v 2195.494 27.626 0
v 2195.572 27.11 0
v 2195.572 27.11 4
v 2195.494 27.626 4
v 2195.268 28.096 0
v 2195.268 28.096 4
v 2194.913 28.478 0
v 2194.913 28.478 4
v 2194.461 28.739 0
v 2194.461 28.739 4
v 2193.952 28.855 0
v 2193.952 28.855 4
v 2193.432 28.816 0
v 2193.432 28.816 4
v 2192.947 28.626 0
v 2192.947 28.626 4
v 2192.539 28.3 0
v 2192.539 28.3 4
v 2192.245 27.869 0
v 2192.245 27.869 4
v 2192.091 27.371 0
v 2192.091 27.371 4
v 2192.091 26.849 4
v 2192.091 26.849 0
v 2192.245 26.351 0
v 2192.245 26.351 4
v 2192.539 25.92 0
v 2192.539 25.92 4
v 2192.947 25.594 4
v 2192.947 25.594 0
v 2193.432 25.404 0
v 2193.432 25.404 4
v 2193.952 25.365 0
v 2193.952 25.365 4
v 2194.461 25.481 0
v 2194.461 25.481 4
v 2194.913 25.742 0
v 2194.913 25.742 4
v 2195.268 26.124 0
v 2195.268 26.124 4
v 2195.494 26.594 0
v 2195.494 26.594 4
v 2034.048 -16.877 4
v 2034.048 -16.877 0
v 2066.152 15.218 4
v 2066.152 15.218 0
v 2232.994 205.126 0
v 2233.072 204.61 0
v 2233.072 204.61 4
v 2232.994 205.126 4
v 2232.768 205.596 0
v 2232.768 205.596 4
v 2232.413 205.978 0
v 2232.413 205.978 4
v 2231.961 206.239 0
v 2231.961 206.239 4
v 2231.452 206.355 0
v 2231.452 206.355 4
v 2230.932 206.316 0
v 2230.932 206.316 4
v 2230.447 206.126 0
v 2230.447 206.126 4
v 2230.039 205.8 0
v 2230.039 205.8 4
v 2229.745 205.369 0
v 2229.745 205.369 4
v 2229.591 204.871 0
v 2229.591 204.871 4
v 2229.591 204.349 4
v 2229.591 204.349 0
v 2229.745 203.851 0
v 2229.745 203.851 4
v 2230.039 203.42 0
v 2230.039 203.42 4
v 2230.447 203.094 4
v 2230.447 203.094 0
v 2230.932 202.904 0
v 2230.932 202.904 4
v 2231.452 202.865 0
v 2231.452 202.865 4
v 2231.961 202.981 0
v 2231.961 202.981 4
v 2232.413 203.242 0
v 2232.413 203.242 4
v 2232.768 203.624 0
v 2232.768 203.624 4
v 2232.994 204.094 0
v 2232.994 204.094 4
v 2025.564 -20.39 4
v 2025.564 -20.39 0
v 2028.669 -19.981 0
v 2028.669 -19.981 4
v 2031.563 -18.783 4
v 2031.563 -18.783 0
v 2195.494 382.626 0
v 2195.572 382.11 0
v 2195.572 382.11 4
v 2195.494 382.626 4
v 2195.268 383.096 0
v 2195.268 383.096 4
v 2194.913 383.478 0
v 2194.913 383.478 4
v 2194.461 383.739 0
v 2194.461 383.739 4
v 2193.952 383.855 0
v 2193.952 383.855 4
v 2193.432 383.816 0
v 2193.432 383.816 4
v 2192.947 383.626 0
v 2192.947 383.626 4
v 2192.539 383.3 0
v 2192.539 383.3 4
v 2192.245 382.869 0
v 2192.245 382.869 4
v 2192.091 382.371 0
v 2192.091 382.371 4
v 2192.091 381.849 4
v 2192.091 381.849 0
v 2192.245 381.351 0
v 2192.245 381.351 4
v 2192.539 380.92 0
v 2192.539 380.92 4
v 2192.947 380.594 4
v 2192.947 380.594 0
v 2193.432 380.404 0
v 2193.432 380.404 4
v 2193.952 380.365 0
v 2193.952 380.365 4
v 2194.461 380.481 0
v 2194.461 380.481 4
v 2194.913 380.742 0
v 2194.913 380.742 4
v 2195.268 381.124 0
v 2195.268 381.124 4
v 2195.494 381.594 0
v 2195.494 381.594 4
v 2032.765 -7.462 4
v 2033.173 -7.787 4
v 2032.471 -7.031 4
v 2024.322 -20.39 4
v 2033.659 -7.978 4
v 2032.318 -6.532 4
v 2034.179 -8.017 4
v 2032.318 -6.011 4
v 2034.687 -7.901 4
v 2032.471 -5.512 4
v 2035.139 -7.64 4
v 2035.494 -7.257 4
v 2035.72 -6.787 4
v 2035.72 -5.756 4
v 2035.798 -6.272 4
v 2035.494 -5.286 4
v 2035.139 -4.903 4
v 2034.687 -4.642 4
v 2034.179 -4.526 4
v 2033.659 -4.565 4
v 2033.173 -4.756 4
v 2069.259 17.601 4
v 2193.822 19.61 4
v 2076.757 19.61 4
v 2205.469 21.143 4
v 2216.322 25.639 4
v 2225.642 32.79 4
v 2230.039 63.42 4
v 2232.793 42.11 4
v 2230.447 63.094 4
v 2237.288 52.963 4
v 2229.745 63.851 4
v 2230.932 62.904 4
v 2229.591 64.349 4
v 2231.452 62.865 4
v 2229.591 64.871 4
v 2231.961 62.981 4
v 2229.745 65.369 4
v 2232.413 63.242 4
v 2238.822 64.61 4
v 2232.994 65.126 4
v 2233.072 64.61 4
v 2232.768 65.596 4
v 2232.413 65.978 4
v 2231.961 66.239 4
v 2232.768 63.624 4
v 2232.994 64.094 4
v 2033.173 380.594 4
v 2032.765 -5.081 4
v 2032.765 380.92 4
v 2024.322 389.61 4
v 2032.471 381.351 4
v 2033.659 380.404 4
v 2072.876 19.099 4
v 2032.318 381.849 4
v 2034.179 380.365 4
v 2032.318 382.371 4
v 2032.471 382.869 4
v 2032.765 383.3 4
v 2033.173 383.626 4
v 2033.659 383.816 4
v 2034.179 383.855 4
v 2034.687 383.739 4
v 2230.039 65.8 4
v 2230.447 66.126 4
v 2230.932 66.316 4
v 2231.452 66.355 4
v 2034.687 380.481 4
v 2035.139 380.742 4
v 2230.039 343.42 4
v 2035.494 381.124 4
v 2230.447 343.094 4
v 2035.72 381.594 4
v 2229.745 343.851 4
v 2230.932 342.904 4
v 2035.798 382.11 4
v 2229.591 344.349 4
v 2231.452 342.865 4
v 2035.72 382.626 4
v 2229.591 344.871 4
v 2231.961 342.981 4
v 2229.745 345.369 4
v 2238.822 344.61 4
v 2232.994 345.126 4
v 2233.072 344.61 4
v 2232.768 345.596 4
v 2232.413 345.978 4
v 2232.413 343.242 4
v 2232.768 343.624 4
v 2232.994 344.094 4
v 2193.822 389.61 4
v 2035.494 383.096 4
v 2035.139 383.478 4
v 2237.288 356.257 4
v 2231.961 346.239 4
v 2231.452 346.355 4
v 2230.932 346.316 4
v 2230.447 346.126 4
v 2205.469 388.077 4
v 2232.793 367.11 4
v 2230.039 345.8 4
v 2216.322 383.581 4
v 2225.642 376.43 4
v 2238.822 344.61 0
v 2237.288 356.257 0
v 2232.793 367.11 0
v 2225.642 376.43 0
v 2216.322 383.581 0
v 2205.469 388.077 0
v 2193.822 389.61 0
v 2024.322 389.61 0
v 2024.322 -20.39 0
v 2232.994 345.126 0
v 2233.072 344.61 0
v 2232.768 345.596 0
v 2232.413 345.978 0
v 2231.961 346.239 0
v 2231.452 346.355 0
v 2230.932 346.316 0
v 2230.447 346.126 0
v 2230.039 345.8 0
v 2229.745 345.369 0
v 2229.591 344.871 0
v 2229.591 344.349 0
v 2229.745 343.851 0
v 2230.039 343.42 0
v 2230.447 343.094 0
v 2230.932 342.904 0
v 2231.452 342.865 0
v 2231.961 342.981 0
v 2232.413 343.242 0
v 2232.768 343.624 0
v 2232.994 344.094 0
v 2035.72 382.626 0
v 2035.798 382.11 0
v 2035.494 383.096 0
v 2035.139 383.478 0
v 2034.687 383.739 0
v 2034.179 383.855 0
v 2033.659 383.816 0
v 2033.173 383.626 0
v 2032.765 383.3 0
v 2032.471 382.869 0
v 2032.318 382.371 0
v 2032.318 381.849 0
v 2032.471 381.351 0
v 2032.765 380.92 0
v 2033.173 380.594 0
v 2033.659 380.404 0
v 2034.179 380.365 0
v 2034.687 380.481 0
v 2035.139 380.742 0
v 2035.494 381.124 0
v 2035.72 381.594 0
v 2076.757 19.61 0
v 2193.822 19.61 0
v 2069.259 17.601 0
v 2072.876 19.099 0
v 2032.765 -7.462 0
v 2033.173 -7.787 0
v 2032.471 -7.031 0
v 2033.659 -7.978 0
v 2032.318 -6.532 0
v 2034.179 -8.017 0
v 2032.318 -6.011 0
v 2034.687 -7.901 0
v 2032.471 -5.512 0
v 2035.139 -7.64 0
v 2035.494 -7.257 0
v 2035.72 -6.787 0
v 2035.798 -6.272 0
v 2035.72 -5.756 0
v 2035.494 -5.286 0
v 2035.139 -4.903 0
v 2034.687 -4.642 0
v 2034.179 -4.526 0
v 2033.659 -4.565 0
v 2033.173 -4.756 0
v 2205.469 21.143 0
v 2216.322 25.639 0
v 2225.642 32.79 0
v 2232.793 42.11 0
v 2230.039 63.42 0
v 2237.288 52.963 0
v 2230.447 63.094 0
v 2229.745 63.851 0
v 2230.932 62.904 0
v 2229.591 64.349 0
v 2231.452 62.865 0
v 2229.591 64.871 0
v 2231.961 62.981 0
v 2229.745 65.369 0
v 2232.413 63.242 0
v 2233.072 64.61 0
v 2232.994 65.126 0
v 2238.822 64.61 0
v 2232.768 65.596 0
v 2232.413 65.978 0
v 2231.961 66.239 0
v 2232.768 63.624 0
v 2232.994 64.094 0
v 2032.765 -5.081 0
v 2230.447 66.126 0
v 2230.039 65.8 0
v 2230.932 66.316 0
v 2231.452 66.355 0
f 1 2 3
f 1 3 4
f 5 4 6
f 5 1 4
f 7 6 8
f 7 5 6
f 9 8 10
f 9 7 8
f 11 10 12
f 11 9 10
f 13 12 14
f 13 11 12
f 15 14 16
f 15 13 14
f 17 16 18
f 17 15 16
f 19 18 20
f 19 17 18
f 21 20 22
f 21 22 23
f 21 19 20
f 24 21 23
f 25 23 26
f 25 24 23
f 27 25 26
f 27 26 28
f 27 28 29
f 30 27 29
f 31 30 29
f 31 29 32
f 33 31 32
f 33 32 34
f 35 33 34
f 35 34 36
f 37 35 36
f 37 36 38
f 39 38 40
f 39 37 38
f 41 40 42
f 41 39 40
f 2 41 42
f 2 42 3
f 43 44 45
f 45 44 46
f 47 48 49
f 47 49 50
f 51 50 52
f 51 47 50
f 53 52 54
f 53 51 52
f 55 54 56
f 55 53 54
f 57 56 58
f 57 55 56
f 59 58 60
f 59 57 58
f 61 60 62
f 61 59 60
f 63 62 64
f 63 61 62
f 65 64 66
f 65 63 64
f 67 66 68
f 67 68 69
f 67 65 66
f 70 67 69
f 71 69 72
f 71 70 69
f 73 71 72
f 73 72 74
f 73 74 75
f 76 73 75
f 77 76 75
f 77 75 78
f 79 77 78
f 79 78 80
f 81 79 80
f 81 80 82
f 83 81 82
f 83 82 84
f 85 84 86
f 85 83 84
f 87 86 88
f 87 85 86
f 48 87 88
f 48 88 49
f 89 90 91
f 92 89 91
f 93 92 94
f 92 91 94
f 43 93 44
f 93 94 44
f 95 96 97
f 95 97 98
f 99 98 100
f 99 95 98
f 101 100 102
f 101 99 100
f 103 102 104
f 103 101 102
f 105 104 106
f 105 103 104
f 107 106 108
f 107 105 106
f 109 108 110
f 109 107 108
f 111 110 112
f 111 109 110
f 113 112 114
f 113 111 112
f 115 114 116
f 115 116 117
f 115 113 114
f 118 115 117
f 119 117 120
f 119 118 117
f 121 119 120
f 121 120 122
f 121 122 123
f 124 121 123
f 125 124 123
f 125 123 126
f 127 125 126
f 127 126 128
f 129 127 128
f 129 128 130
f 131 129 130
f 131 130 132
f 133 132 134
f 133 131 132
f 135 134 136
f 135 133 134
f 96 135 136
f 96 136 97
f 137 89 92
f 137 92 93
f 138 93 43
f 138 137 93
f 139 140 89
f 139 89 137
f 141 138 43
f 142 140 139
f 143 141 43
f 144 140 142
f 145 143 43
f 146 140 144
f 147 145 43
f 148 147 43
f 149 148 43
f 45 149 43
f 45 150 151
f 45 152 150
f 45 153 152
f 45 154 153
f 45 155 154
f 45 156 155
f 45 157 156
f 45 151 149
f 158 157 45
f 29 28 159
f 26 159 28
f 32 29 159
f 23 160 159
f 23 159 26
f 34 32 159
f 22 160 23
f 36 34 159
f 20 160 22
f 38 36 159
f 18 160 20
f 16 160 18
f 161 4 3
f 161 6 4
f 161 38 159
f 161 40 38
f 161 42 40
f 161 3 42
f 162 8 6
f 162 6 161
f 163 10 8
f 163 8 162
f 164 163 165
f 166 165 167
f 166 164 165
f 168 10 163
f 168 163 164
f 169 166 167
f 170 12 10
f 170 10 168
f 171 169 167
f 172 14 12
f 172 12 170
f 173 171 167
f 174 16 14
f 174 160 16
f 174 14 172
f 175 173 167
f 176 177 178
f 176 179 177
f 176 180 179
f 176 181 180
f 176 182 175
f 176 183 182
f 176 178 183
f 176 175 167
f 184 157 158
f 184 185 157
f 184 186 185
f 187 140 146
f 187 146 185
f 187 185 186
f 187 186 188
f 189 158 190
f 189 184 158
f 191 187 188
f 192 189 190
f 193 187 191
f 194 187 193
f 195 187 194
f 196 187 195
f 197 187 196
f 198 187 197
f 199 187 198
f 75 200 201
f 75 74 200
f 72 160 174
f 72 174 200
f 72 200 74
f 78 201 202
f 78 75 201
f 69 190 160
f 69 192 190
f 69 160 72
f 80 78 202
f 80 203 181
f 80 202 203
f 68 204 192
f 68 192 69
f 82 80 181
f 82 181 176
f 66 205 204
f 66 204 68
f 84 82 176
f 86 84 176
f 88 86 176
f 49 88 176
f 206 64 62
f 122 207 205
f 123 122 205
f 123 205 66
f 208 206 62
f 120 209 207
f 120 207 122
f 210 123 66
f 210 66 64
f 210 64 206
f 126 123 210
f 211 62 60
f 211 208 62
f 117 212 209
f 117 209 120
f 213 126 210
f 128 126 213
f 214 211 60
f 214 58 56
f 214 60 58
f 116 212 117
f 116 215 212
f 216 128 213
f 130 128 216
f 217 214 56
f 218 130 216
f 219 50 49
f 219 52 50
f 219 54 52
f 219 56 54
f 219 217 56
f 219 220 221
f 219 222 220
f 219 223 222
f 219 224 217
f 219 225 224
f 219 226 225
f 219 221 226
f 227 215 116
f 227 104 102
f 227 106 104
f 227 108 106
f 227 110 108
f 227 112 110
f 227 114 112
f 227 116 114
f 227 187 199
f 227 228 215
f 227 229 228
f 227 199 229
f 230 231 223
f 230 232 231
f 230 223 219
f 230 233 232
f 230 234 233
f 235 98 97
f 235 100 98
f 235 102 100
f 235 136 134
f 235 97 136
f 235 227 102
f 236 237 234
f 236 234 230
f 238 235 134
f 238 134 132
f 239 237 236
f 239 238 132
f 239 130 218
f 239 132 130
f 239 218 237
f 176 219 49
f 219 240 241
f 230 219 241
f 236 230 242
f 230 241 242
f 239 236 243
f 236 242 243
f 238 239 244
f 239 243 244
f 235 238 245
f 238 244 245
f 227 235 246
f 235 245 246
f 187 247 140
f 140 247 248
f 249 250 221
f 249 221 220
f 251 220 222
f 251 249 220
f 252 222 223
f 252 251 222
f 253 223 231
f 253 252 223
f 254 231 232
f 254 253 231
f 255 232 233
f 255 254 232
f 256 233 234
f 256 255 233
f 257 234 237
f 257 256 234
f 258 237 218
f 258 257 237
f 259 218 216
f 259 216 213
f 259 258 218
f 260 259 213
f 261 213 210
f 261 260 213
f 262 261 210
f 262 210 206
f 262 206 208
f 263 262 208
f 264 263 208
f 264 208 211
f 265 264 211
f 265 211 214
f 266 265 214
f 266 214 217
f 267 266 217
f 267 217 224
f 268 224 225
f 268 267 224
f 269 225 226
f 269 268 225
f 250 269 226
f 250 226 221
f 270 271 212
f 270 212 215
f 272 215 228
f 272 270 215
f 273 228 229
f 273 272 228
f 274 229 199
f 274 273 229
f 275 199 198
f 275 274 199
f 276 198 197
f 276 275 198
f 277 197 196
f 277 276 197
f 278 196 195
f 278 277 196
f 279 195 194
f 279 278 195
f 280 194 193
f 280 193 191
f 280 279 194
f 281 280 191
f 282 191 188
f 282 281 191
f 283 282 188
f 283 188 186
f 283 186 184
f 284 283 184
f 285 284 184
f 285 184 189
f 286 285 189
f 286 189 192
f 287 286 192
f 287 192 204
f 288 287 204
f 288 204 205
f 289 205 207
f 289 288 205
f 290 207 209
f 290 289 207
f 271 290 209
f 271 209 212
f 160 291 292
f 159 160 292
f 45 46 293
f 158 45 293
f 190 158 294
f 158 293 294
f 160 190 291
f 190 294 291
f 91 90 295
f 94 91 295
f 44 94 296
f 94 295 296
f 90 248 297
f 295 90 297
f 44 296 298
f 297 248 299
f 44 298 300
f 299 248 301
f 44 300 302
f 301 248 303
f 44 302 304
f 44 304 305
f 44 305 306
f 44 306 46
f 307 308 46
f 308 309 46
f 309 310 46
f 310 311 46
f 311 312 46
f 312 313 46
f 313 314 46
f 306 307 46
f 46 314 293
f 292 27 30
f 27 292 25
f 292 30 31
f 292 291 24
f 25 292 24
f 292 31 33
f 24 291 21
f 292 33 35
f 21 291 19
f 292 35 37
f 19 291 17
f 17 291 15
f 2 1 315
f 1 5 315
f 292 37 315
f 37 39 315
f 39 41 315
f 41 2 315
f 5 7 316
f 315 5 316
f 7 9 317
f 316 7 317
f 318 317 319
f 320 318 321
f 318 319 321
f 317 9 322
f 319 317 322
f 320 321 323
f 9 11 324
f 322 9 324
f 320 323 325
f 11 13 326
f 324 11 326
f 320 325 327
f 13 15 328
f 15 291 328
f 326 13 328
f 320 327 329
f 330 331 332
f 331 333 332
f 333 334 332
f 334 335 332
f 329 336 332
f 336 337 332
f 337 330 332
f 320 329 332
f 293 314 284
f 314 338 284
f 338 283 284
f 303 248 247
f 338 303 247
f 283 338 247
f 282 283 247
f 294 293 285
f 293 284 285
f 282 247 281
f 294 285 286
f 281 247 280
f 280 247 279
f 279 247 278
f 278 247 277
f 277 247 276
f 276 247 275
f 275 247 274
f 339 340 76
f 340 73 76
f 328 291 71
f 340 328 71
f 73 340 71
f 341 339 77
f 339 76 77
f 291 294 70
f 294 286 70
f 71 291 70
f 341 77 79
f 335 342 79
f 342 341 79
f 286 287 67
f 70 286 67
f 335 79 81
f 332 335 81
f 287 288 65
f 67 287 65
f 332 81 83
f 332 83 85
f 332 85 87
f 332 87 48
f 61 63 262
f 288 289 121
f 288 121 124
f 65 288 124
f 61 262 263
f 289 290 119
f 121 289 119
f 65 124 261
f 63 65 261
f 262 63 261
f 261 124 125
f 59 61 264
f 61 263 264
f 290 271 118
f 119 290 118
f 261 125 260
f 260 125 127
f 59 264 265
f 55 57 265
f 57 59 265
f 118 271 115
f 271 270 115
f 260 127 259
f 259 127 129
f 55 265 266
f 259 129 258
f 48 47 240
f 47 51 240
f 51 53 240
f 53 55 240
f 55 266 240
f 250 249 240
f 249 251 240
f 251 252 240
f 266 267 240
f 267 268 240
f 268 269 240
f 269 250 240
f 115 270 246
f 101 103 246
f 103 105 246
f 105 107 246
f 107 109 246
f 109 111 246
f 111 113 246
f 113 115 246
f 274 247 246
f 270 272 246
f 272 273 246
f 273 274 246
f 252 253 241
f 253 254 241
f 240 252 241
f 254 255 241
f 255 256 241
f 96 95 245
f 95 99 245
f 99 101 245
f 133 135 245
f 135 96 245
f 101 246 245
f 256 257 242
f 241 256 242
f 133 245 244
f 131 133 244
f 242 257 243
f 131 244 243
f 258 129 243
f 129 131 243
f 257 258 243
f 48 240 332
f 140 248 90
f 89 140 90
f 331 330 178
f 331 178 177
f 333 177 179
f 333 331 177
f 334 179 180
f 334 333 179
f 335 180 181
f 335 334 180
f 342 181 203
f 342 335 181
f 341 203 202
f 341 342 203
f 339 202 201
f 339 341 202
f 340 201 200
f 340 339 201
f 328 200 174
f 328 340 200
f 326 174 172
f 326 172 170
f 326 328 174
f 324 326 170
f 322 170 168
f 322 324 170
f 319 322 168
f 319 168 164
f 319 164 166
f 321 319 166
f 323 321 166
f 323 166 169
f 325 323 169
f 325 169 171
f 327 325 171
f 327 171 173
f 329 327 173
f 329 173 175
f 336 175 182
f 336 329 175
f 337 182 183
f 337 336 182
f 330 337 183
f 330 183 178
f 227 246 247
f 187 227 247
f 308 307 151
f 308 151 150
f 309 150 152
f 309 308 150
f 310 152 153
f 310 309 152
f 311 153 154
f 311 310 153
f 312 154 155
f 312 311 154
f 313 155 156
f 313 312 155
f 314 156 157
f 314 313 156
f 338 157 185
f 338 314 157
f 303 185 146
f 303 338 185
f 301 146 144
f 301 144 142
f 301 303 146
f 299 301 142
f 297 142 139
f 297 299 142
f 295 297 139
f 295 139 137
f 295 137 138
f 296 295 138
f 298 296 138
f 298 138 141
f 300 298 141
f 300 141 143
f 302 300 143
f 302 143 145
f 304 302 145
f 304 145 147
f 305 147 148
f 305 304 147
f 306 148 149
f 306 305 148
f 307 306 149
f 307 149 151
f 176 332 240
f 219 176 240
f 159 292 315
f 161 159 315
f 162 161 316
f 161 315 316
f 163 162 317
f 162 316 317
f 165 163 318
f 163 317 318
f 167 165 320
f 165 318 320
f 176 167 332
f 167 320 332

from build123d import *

# Parameters (mm, degrees)
SKETCH1_R           = 1.75
BOSS_EXTRUDE1_DEPTH = 4


with BuildPart() as part:
    # Sketch1 → Boss-Extrude1 (new body)
    with BuildSketch(Plane.XY):
        with BuildLine():
            Line((2024.321699886, -20.389970185), (2025.564078039, -20.389970185))
            ThreePointArc((2025.564078039, -20.389970185), (2030.155451072, -19.476867572), (2034.048091653, -16.876519131))
            Line((2034.048091653, -16.876519131), (2066.152417854, 15.218215997))
            ThreePointArc((2066.152417854, 15.218215997), (2071.01821858, 18.468651549), (2076.757434871, 19.610029815))
            Line((2076.757434871, 19.610029815), (2193.821699886, 19.610029815))
            ThreePointArc((2193.821699886, 19.610029815), (2225.64150504, 32.790224661), (2238.821699886, 64.610029815))
            Line((2238.821699886, 64.610029815), (2238.821699886, 344.610029815))
            ThreePointArc((2238.821699886, 344.610029815), (2225.64150504, 376.429834968), (2193.821699886, 389.610029815))
            Line((2193.821699886, 389.610029815), (2024.321699886, 389.610029815))
            Line((2024.321699886, 389.610029815), (2024.321699886, -20.389970185))
        make_face()
        with Locations((2034.048091653, -6.27150164)):
            Circle(SKETCH1_R, mode=Mode.SUBTRACT)
        with Locations((2193.821699886, 27.110029815)):
            Circle(SKETCH1_R, mode=Mode.SUBTRACT)
        with Locations((2231.321699886, 64.610029815)):
            Circle(SKETCH1_R, mode=Mode.SUBTRACT)
        with Locations((2231.321699886, 204.610029815)):
            Circle(SKETCH1_R, mode=Mode.SUBTRACT)
        with Locations((2231.321699886, 344.610029815)):
            Circle(SKETCH1_R, mode=Mode.SUBTRACT)
        with Locations((2193.821699886, 382.110029815)):
            Circle(SKETCH1_R, mode=Mode.SUBTRACT)
        with Locations((2034.048091653, 382.110029815)):
            Circle(SKETCH1_R, mode=Mode.SUBTRACT)
    extrude(amount=BOSS_EXTRUDE1_DEPTH)


solid = part.part
